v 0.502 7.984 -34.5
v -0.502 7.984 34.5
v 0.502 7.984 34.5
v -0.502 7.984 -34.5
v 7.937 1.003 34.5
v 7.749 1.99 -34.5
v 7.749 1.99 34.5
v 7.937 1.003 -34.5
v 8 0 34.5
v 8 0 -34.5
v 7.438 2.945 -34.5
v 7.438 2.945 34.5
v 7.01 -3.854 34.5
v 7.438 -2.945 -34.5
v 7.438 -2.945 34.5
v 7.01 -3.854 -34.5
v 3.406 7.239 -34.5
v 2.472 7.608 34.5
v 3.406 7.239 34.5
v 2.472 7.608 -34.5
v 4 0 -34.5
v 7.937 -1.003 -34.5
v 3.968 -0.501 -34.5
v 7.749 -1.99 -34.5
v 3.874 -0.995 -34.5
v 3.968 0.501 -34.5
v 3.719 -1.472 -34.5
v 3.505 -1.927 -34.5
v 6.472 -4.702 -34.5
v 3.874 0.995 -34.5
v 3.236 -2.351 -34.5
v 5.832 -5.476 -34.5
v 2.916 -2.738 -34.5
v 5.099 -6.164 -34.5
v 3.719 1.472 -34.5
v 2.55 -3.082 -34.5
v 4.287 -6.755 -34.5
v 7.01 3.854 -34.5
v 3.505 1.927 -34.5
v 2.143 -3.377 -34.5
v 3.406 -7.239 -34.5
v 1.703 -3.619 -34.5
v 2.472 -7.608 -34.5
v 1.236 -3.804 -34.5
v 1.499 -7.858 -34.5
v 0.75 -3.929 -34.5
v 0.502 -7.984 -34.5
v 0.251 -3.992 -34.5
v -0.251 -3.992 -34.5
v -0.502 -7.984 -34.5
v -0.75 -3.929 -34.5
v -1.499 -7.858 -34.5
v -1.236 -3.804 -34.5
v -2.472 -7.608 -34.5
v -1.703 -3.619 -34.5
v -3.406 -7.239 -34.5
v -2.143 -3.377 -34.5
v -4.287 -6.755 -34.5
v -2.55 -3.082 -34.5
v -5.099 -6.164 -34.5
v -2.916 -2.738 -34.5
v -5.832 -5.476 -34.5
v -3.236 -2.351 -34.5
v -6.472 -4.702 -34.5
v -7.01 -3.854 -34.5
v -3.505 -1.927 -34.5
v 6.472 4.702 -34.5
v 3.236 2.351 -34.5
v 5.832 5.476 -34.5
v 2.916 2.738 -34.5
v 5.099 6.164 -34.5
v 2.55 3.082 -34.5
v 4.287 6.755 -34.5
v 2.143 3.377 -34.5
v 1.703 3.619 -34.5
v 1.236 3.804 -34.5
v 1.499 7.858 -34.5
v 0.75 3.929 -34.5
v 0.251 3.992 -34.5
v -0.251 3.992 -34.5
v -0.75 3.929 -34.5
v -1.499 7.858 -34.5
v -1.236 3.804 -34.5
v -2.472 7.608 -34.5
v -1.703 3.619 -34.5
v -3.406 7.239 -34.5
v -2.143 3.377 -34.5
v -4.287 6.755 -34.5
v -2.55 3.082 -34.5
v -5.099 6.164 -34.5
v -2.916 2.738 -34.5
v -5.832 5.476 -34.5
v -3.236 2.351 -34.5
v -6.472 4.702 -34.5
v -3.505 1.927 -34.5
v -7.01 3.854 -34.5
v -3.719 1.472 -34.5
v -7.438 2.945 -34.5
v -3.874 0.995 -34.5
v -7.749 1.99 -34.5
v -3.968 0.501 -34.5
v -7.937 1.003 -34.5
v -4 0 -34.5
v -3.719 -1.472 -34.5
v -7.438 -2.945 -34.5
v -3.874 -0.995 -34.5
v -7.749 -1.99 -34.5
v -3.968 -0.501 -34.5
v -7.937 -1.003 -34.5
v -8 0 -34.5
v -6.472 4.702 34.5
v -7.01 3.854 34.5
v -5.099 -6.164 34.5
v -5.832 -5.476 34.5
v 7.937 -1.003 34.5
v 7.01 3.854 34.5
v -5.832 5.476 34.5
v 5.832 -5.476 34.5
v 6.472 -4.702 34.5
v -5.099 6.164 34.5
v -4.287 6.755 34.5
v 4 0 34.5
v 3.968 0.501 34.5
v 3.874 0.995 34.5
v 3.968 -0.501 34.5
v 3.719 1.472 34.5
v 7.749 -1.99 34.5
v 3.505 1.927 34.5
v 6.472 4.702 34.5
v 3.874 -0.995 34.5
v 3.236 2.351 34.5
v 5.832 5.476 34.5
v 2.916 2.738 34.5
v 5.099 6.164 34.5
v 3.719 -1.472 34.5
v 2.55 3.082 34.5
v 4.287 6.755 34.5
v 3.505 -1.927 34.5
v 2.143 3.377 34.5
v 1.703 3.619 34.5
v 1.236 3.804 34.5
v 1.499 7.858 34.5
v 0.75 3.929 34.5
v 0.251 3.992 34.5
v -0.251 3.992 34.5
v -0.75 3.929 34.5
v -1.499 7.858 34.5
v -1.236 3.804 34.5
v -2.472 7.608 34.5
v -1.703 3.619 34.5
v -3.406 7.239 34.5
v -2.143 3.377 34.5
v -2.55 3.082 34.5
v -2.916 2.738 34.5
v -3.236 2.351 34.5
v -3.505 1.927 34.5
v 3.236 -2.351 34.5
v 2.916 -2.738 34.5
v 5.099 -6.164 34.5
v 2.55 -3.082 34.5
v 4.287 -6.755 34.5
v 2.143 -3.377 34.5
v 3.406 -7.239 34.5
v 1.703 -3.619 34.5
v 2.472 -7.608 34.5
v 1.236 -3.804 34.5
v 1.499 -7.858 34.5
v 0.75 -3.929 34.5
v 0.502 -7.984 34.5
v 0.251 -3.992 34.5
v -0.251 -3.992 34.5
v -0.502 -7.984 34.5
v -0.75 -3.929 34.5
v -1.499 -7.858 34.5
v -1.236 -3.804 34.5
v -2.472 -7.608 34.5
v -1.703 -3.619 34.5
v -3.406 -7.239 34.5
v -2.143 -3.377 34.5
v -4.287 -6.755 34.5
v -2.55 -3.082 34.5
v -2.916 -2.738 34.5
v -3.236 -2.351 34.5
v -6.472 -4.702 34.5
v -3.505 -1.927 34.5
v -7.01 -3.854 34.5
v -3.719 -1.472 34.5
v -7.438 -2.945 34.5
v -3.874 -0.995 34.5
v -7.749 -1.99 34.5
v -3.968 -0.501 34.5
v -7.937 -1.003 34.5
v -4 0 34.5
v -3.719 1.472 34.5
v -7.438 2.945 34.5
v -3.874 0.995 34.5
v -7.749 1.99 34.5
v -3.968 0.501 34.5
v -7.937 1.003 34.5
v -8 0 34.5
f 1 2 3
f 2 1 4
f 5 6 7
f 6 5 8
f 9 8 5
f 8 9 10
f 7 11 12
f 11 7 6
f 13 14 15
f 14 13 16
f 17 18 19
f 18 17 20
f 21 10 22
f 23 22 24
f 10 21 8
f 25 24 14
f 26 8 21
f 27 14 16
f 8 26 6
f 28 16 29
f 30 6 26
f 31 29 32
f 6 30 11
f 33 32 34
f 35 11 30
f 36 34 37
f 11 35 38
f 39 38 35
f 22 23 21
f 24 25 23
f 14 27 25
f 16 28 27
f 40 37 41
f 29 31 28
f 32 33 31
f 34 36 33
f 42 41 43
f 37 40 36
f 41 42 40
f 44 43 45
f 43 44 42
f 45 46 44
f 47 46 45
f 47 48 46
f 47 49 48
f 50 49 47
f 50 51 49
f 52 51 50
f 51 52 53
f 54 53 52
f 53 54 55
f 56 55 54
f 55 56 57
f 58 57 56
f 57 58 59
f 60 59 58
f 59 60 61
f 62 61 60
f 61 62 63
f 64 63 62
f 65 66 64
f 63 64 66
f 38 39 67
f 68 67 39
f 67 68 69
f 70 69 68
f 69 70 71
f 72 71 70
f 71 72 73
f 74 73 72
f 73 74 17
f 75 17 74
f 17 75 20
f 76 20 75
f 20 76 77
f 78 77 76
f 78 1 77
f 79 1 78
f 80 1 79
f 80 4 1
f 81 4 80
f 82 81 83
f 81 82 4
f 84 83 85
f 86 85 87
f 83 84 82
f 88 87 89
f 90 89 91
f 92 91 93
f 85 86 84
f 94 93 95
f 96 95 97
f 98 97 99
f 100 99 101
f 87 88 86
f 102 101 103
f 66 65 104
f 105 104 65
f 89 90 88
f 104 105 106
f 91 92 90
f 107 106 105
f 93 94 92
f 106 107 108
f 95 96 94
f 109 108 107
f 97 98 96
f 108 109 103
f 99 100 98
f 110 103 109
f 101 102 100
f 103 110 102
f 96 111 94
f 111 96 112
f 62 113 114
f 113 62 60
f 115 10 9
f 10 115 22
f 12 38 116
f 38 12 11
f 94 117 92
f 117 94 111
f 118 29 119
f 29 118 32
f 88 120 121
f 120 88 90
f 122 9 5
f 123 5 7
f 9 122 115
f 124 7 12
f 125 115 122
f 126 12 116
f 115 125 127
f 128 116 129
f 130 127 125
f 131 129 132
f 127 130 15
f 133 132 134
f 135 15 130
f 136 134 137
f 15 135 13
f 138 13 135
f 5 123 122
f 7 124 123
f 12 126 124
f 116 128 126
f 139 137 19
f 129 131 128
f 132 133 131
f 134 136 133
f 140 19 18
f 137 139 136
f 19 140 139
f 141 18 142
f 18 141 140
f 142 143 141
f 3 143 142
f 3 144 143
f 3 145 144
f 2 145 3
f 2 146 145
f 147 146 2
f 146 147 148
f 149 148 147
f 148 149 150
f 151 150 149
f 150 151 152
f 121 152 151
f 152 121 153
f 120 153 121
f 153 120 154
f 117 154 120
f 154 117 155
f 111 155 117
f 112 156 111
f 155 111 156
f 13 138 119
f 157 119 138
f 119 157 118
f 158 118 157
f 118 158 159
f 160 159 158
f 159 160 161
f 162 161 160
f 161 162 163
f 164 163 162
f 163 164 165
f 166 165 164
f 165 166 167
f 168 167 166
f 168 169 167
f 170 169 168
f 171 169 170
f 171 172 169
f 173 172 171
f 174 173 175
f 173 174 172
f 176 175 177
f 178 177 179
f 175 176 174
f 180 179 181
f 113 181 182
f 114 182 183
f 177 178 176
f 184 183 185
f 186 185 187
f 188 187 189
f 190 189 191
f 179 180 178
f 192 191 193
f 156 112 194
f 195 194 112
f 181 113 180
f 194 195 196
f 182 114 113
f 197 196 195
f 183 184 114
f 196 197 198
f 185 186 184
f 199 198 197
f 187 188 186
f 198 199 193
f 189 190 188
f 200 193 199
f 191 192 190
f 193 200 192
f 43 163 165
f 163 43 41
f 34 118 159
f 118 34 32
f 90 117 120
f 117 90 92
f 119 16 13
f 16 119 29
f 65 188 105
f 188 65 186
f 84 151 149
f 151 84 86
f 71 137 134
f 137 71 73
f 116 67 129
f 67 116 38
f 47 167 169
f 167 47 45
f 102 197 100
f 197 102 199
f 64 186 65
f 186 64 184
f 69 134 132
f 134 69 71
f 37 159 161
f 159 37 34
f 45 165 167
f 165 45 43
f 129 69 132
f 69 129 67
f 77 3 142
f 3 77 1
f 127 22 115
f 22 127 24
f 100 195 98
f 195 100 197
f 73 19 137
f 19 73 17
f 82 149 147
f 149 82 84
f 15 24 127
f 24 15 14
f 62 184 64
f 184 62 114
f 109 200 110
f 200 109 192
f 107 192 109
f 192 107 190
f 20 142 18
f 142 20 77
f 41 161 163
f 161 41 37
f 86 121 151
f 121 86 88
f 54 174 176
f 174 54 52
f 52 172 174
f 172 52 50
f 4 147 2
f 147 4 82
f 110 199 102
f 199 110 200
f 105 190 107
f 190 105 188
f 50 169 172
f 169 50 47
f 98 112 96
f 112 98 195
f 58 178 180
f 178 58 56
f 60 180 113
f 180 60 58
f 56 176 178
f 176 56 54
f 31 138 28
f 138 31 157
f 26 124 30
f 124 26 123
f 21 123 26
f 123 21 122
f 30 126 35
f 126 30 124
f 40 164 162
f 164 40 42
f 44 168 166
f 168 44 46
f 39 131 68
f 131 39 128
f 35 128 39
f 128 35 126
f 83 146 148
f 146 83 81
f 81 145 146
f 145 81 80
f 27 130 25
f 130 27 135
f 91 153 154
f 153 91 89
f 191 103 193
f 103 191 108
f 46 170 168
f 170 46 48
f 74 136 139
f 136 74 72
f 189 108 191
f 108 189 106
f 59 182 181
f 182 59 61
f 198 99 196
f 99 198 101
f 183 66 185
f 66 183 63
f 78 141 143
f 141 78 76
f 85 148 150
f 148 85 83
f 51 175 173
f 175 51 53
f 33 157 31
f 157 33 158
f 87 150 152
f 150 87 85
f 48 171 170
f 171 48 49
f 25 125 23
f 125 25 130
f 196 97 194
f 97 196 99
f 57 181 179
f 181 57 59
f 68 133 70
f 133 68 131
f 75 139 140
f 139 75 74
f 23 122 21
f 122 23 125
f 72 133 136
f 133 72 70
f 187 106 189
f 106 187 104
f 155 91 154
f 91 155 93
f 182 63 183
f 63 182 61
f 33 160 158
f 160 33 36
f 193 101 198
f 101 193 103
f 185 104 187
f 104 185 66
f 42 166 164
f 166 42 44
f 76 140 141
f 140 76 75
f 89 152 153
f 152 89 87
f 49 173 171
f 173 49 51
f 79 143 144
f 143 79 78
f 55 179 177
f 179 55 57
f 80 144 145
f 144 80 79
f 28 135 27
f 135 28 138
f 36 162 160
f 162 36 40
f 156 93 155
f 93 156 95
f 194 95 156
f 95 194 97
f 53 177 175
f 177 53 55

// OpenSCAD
$fn = 50;


difference() {
	union() {
		translate(v = [0, 0, -34.5000000000]) {
			cylinder(h = 69, r = 8.0000000000);
		}
	}
	union() {
		translate(v = [0, 0, -100.0000000000]) {
			cylinder(h = 200, r = 4.0000000000);
		}
	}
}
